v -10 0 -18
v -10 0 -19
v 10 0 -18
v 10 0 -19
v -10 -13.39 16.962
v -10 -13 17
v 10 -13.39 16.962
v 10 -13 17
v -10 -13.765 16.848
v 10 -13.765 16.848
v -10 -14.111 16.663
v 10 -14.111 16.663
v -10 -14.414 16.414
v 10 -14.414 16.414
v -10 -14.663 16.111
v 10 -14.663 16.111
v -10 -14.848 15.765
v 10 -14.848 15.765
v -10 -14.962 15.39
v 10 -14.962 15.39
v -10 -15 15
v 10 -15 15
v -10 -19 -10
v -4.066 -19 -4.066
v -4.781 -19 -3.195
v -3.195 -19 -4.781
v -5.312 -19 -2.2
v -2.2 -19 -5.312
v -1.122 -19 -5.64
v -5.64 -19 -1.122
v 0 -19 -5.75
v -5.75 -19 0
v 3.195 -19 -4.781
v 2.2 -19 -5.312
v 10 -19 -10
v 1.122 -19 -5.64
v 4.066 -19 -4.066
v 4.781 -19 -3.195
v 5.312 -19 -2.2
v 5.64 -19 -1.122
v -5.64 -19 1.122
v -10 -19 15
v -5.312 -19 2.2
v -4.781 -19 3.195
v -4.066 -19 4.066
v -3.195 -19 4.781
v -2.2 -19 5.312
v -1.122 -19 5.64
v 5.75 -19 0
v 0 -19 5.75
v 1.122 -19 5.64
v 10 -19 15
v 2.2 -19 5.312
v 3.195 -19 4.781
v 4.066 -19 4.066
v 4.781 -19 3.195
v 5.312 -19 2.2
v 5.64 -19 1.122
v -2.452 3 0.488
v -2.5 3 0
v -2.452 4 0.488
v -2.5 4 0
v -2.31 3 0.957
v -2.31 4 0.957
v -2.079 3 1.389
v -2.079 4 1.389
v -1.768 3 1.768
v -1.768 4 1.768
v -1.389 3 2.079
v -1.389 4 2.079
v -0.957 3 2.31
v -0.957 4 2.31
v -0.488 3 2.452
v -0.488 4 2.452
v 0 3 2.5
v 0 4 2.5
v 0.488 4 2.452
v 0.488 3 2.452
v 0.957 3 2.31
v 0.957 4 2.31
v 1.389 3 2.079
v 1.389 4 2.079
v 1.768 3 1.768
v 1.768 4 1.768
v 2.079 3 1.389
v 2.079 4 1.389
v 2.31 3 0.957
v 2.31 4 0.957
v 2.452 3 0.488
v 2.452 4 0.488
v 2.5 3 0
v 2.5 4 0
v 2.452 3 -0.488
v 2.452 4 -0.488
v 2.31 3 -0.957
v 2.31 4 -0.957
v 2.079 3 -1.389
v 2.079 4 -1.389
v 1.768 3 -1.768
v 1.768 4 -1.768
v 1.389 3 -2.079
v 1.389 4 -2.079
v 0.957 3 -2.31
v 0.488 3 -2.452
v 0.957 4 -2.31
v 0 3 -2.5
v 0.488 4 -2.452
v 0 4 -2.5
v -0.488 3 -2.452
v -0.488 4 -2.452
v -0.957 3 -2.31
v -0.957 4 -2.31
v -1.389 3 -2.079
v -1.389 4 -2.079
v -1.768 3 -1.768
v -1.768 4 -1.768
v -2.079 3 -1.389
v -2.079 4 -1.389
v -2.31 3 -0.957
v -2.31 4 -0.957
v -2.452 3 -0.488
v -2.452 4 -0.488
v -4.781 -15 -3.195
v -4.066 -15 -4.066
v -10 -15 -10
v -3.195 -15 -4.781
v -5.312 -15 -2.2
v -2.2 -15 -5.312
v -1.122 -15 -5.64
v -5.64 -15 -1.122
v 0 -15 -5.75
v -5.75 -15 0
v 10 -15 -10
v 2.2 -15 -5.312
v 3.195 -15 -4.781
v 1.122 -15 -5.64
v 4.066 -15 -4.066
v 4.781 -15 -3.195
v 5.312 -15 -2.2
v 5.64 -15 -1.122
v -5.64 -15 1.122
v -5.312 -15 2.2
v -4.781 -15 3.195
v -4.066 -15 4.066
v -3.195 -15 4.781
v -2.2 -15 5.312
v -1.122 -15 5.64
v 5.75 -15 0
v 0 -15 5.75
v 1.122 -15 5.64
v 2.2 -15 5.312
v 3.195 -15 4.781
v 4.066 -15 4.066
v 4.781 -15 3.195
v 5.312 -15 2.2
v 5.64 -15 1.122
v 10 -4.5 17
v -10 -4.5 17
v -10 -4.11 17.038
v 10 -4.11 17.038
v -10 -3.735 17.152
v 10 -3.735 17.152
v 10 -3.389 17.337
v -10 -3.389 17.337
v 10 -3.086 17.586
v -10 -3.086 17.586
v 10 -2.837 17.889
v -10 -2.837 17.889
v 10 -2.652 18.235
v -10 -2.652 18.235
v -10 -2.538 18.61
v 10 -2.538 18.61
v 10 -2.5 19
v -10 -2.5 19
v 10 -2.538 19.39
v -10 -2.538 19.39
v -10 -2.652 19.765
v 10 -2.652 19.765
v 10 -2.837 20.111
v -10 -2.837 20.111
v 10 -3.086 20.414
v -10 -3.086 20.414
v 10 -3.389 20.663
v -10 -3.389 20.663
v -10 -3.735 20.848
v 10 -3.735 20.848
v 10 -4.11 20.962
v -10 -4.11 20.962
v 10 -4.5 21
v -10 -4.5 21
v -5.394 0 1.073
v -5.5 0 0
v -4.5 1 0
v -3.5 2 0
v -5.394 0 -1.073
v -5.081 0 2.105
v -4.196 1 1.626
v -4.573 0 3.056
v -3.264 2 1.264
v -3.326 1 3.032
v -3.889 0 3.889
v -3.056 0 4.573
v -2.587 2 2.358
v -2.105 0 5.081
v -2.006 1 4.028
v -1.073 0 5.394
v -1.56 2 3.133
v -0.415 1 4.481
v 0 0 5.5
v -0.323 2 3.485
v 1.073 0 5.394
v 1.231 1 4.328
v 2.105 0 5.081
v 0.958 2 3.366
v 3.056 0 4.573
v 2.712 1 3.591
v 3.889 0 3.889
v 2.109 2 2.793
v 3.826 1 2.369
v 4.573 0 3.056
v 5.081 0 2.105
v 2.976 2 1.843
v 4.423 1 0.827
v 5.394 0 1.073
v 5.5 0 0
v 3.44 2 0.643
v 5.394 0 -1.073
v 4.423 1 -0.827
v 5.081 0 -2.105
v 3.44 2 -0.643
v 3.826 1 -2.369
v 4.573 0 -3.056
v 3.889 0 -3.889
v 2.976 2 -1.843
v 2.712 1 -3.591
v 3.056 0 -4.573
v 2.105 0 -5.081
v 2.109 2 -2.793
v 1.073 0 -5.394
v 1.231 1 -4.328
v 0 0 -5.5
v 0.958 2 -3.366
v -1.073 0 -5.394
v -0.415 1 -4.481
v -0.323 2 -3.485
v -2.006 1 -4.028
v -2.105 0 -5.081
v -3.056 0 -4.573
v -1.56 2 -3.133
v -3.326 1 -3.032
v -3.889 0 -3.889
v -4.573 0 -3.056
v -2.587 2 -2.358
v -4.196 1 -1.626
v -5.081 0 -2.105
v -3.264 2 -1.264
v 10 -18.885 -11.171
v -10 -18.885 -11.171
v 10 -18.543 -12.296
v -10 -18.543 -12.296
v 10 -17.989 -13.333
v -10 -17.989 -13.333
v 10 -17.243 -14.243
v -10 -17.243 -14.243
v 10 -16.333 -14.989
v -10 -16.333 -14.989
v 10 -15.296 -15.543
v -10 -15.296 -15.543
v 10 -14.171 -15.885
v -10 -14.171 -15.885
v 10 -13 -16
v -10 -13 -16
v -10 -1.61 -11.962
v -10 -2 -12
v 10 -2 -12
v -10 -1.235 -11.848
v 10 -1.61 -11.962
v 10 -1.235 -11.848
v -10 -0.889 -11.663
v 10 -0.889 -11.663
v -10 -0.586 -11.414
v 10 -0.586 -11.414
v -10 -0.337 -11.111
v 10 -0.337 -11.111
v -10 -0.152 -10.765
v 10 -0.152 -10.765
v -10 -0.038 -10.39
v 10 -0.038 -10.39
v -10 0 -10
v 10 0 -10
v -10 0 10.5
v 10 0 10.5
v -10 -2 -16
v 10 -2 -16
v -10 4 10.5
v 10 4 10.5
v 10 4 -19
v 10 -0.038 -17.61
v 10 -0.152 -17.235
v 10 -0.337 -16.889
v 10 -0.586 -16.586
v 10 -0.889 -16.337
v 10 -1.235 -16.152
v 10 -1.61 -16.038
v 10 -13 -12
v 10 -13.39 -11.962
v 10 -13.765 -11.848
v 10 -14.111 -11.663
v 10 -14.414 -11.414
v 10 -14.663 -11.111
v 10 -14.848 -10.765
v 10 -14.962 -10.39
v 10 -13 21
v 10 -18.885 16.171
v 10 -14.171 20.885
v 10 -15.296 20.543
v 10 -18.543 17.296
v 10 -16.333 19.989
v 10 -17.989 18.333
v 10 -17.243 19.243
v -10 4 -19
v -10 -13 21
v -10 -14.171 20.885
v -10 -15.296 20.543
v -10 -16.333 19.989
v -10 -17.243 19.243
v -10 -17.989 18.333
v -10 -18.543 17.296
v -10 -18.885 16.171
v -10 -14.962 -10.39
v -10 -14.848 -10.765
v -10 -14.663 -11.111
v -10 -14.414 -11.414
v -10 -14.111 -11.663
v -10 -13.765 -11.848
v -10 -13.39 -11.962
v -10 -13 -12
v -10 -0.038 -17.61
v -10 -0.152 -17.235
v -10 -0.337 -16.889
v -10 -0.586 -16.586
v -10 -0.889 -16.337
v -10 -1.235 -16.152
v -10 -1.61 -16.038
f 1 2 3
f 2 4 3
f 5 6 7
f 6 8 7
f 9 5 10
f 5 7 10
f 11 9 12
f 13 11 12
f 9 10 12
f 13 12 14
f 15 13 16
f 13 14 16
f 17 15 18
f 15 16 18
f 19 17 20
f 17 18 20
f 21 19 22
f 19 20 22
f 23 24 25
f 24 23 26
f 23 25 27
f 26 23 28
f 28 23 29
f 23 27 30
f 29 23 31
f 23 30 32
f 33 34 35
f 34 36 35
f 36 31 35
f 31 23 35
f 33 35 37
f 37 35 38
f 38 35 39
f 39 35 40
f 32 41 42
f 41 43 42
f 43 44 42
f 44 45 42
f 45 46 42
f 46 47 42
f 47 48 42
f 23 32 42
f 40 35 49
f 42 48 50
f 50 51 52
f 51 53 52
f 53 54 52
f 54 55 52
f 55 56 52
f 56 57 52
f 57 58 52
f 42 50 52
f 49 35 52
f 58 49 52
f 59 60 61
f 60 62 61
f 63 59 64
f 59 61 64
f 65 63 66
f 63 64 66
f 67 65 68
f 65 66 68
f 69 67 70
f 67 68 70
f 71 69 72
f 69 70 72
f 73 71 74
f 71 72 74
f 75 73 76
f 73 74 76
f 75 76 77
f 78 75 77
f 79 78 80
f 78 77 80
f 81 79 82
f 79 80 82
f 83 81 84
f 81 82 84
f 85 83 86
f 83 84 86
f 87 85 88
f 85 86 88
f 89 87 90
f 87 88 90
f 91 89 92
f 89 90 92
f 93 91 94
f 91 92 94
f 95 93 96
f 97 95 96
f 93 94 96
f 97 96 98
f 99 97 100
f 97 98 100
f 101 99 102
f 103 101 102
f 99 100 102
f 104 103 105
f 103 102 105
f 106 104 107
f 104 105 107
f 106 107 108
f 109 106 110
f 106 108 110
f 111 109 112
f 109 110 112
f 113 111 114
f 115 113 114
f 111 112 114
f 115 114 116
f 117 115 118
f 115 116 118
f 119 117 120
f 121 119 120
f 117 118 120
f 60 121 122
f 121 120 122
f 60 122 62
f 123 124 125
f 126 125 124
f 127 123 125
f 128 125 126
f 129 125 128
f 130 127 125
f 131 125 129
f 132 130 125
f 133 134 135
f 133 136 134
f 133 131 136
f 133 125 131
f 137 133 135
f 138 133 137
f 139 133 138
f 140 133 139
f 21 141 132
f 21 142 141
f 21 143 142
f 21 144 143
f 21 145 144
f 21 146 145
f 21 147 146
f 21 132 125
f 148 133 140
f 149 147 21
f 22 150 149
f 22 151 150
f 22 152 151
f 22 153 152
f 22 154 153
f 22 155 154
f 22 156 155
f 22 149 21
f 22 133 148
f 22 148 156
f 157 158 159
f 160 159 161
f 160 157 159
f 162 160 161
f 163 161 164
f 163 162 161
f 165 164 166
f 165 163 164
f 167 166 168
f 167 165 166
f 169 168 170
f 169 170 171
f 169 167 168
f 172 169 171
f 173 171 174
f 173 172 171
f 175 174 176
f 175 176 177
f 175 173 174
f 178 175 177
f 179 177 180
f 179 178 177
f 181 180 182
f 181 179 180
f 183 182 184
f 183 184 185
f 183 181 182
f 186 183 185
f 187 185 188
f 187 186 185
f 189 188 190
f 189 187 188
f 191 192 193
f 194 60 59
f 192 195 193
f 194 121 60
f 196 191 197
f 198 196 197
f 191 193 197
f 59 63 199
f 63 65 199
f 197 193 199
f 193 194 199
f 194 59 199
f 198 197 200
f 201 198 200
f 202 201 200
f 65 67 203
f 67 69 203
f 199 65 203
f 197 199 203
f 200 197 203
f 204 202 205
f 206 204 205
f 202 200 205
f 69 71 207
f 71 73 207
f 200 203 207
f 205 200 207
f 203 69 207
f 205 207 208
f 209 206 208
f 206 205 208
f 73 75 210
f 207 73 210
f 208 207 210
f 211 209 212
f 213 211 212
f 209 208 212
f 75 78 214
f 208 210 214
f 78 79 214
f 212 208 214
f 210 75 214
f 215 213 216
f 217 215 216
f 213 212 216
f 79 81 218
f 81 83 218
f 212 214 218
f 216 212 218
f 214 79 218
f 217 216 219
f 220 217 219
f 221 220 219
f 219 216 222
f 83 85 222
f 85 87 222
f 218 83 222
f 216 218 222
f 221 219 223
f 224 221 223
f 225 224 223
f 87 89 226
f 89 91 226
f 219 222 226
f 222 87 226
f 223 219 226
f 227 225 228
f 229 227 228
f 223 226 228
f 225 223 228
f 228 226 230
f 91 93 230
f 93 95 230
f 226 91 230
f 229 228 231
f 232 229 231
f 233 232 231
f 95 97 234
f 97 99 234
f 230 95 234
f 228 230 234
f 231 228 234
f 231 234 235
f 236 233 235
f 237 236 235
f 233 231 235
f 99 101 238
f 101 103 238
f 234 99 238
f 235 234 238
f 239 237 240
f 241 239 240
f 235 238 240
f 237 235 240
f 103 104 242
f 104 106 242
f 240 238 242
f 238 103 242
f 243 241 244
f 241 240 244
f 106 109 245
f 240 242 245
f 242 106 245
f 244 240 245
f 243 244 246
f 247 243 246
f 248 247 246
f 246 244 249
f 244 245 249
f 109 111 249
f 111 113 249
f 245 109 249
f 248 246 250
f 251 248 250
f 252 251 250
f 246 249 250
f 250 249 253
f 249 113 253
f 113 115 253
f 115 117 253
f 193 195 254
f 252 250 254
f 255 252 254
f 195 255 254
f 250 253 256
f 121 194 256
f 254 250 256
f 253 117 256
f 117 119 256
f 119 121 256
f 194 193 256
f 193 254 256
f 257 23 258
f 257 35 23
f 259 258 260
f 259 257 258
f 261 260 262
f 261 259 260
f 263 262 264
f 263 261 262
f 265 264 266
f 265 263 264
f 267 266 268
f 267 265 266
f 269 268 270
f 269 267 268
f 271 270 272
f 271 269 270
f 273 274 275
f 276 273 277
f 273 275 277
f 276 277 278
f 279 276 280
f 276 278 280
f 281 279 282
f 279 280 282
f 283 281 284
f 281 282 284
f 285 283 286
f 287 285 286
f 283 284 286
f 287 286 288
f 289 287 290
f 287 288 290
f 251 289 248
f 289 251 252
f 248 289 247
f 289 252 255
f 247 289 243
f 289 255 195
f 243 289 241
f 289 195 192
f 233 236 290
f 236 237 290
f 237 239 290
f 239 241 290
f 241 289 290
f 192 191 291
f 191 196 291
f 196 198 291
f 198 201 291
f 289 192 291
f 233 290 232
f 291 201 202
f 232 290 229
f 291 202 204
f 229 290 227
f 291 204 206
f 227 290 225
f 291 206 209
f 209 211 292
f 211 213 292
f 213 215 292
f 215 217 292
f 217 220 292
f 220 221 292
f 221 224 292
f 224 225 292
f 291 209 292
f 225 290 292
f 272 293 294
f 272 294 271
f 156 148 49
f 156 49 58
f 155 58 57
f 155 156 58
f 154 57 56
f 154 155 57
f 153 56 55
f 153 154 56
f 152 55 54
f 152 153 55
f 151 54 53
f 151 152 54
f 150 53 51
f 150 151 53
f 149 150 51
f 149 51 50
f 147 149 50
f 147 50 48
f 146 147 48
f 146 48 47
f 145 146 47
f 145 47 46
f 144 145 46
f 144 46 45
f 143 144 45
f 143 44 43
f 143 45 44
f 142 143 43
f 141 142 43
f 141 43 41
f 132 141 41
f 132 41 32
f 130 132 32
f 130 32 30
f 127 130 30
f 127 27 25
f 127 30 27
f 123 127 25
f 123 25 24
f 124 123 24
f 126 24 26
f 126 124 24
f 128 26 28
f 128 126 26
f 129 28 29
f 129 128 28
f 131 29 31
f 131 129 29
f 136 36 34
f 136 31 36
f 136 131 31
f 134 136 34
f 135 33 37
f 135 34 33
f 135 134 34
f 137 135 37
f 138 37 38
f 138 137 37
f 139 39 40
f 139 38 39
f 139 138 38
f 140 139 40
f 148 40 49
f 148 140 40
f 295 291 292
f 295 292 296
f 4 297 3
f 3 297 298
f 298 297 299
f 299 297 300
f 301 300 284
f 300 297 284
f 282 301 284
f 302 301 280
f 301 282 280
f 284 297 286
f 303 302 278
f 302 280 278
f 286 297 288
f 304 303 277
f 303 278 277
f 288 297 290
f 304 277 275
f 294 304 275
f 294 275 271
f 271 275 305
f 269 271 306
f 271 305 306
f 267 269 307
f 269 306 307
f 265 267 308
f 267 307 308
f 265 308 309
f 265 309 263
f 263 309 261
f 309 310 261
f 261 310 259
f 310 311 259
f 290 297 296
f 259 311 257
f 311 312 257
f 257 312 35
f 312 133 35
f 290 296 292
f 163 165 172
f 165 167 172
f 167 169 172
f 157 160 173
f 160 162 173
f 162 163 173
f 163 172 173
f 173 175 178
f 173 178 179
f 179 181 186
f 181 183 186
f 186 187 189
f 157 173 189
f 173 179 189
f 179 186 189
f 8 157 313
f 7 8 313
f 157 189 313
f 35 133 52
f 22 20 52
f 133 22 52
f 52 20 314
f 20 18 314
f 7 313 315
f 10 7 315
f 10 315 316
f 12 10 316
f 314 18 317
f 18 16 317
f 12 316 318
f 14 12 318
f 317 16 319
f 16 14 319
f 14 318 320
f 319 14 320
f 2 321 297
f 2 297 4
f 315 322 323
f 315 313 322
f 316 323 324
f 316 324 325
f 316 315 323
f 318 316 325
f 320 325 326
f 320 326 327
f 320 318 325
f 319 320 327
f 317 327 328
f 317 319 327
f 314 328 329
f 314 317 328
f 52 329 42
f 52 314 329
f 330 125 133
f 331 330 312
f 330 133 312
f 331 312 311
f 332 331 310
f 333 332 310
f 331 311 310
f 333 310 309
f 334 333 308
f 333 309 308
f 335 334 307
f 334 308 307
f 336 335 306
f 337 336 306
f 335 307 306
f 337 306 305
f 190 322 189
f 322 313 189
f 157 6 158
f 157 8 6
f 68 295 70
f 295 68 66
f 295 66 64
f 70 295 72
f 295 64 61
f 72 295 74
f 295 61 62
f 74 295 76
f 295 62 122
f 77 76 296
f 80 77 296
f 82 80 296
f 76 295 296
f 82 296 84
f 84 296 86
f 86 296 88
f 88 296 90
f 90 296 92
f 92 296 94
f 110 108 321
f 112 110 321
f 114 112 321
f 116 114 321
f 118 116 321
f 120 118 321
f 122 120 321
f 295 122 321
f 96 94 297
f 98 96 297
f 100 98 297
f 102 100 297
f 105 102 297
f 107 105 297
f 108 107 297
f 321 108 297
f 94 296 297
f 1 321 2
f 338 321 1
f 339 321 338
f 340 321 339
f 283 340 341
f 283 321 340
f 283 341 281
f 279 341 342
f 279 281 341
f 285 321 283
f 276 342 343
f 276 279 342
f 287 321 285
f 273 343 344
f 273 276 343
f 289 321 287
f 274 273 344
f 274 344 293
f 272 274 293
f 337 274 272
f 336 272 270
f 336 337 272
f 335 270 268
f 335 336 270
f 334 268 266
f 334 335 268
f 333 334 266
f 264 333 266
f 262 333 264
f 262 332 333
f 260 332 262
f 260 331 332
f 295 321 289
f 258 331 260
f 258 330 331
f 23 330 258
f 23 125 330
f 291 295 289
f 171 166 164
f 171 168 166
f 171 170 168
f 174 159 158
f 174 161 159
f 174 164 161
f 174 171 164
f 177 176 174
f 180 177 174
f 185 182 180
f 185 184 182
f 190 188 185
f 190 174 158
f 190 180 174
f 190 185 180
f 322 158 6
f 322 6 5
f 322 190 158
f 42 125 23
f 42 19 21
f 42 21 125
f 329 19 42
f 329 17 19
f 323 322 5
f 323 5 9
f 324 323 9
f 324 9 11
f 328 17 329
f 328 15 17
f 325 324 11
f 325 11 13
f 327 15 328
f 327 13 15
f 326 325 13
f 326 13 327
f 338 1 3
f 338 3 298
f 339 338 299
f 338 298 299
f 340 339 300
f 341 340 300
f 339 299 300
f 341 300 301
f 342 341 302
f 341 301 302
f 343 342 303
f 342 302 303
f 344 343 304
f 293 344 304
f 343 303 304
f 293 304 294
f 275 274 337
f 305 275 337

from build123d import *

# Parameters (mm, degrees)
PAD_DEPTH        = 10
HOLE_D           = 5
HOLE_CSINK_D     = 11
HOLE_CSINK_ANGLE = 90
SKETCH002_R      = 5.75
POCKET_DEPTH     = 19.001


with BuildPart() as part:
    # Sketch → Pad (new body, symmetric)
    with BuildSketch(Plane.YZ):
        with BuildLine():
            Line((0, -10), (0, 10.5))
            Line((0, 10.5), (4, 10.5))
            Line((4, 10.5), (4, -19))
            Line((4, -19), (0, -19))
            Line((0, -19), (0, -18))
            ThreePointArc((0, -18), (-0.585786, -16.585786), (-2, -16))
            Line((-2, -16), (-13, -16))
            ThreePointArc((-19, -10), (-17.242641, -14.242641), (-13, -16))
            Line((-19, -10), (-19, 15))
            ThreePointArc((-13, 21), (-17.242641, 19.242641), (-19, 15))
            Line((-13, 21), (-4.5, 21))
            ThreePointArc((-4.5, 17), (-2.5, 19), (-4.5, 21))
            Line((-13, 17), (-4.5, 17))
            ThreePointArc((-13, 17), (-14.414214, 16.414214), (-15, 15))
            Line((-15, -10), (-15, 15))
            ThreePointArc((-15, -10), (-14.414214, -11.414214), (-13, -12))
            Line((-2, -12), (-13, -12))
            ThreePointArc((-2, -12), (-0.585786, -11.414214), (0, -10))
        make_face()
    extrude(amount=PAD_DEPTH, both=True)

    # Hole (through all)
    with Locations(Plane.XZ):
        with Locations((0, 0)):
            CounterSinkHole(HOLE_D / 2, HOLE_CSINK_D / 2, counter_sink_angle=HOLE_CSINK_ANGLE)

    # Sketch002 → Pocket (cut, through all)
    with BuildSketch(Plane.XZ):
        Circle(SKETCH002_R)
    extrude(amount=POCKET_DEPTH, mode=Mode.SUBTRACT)


solid = part.part
